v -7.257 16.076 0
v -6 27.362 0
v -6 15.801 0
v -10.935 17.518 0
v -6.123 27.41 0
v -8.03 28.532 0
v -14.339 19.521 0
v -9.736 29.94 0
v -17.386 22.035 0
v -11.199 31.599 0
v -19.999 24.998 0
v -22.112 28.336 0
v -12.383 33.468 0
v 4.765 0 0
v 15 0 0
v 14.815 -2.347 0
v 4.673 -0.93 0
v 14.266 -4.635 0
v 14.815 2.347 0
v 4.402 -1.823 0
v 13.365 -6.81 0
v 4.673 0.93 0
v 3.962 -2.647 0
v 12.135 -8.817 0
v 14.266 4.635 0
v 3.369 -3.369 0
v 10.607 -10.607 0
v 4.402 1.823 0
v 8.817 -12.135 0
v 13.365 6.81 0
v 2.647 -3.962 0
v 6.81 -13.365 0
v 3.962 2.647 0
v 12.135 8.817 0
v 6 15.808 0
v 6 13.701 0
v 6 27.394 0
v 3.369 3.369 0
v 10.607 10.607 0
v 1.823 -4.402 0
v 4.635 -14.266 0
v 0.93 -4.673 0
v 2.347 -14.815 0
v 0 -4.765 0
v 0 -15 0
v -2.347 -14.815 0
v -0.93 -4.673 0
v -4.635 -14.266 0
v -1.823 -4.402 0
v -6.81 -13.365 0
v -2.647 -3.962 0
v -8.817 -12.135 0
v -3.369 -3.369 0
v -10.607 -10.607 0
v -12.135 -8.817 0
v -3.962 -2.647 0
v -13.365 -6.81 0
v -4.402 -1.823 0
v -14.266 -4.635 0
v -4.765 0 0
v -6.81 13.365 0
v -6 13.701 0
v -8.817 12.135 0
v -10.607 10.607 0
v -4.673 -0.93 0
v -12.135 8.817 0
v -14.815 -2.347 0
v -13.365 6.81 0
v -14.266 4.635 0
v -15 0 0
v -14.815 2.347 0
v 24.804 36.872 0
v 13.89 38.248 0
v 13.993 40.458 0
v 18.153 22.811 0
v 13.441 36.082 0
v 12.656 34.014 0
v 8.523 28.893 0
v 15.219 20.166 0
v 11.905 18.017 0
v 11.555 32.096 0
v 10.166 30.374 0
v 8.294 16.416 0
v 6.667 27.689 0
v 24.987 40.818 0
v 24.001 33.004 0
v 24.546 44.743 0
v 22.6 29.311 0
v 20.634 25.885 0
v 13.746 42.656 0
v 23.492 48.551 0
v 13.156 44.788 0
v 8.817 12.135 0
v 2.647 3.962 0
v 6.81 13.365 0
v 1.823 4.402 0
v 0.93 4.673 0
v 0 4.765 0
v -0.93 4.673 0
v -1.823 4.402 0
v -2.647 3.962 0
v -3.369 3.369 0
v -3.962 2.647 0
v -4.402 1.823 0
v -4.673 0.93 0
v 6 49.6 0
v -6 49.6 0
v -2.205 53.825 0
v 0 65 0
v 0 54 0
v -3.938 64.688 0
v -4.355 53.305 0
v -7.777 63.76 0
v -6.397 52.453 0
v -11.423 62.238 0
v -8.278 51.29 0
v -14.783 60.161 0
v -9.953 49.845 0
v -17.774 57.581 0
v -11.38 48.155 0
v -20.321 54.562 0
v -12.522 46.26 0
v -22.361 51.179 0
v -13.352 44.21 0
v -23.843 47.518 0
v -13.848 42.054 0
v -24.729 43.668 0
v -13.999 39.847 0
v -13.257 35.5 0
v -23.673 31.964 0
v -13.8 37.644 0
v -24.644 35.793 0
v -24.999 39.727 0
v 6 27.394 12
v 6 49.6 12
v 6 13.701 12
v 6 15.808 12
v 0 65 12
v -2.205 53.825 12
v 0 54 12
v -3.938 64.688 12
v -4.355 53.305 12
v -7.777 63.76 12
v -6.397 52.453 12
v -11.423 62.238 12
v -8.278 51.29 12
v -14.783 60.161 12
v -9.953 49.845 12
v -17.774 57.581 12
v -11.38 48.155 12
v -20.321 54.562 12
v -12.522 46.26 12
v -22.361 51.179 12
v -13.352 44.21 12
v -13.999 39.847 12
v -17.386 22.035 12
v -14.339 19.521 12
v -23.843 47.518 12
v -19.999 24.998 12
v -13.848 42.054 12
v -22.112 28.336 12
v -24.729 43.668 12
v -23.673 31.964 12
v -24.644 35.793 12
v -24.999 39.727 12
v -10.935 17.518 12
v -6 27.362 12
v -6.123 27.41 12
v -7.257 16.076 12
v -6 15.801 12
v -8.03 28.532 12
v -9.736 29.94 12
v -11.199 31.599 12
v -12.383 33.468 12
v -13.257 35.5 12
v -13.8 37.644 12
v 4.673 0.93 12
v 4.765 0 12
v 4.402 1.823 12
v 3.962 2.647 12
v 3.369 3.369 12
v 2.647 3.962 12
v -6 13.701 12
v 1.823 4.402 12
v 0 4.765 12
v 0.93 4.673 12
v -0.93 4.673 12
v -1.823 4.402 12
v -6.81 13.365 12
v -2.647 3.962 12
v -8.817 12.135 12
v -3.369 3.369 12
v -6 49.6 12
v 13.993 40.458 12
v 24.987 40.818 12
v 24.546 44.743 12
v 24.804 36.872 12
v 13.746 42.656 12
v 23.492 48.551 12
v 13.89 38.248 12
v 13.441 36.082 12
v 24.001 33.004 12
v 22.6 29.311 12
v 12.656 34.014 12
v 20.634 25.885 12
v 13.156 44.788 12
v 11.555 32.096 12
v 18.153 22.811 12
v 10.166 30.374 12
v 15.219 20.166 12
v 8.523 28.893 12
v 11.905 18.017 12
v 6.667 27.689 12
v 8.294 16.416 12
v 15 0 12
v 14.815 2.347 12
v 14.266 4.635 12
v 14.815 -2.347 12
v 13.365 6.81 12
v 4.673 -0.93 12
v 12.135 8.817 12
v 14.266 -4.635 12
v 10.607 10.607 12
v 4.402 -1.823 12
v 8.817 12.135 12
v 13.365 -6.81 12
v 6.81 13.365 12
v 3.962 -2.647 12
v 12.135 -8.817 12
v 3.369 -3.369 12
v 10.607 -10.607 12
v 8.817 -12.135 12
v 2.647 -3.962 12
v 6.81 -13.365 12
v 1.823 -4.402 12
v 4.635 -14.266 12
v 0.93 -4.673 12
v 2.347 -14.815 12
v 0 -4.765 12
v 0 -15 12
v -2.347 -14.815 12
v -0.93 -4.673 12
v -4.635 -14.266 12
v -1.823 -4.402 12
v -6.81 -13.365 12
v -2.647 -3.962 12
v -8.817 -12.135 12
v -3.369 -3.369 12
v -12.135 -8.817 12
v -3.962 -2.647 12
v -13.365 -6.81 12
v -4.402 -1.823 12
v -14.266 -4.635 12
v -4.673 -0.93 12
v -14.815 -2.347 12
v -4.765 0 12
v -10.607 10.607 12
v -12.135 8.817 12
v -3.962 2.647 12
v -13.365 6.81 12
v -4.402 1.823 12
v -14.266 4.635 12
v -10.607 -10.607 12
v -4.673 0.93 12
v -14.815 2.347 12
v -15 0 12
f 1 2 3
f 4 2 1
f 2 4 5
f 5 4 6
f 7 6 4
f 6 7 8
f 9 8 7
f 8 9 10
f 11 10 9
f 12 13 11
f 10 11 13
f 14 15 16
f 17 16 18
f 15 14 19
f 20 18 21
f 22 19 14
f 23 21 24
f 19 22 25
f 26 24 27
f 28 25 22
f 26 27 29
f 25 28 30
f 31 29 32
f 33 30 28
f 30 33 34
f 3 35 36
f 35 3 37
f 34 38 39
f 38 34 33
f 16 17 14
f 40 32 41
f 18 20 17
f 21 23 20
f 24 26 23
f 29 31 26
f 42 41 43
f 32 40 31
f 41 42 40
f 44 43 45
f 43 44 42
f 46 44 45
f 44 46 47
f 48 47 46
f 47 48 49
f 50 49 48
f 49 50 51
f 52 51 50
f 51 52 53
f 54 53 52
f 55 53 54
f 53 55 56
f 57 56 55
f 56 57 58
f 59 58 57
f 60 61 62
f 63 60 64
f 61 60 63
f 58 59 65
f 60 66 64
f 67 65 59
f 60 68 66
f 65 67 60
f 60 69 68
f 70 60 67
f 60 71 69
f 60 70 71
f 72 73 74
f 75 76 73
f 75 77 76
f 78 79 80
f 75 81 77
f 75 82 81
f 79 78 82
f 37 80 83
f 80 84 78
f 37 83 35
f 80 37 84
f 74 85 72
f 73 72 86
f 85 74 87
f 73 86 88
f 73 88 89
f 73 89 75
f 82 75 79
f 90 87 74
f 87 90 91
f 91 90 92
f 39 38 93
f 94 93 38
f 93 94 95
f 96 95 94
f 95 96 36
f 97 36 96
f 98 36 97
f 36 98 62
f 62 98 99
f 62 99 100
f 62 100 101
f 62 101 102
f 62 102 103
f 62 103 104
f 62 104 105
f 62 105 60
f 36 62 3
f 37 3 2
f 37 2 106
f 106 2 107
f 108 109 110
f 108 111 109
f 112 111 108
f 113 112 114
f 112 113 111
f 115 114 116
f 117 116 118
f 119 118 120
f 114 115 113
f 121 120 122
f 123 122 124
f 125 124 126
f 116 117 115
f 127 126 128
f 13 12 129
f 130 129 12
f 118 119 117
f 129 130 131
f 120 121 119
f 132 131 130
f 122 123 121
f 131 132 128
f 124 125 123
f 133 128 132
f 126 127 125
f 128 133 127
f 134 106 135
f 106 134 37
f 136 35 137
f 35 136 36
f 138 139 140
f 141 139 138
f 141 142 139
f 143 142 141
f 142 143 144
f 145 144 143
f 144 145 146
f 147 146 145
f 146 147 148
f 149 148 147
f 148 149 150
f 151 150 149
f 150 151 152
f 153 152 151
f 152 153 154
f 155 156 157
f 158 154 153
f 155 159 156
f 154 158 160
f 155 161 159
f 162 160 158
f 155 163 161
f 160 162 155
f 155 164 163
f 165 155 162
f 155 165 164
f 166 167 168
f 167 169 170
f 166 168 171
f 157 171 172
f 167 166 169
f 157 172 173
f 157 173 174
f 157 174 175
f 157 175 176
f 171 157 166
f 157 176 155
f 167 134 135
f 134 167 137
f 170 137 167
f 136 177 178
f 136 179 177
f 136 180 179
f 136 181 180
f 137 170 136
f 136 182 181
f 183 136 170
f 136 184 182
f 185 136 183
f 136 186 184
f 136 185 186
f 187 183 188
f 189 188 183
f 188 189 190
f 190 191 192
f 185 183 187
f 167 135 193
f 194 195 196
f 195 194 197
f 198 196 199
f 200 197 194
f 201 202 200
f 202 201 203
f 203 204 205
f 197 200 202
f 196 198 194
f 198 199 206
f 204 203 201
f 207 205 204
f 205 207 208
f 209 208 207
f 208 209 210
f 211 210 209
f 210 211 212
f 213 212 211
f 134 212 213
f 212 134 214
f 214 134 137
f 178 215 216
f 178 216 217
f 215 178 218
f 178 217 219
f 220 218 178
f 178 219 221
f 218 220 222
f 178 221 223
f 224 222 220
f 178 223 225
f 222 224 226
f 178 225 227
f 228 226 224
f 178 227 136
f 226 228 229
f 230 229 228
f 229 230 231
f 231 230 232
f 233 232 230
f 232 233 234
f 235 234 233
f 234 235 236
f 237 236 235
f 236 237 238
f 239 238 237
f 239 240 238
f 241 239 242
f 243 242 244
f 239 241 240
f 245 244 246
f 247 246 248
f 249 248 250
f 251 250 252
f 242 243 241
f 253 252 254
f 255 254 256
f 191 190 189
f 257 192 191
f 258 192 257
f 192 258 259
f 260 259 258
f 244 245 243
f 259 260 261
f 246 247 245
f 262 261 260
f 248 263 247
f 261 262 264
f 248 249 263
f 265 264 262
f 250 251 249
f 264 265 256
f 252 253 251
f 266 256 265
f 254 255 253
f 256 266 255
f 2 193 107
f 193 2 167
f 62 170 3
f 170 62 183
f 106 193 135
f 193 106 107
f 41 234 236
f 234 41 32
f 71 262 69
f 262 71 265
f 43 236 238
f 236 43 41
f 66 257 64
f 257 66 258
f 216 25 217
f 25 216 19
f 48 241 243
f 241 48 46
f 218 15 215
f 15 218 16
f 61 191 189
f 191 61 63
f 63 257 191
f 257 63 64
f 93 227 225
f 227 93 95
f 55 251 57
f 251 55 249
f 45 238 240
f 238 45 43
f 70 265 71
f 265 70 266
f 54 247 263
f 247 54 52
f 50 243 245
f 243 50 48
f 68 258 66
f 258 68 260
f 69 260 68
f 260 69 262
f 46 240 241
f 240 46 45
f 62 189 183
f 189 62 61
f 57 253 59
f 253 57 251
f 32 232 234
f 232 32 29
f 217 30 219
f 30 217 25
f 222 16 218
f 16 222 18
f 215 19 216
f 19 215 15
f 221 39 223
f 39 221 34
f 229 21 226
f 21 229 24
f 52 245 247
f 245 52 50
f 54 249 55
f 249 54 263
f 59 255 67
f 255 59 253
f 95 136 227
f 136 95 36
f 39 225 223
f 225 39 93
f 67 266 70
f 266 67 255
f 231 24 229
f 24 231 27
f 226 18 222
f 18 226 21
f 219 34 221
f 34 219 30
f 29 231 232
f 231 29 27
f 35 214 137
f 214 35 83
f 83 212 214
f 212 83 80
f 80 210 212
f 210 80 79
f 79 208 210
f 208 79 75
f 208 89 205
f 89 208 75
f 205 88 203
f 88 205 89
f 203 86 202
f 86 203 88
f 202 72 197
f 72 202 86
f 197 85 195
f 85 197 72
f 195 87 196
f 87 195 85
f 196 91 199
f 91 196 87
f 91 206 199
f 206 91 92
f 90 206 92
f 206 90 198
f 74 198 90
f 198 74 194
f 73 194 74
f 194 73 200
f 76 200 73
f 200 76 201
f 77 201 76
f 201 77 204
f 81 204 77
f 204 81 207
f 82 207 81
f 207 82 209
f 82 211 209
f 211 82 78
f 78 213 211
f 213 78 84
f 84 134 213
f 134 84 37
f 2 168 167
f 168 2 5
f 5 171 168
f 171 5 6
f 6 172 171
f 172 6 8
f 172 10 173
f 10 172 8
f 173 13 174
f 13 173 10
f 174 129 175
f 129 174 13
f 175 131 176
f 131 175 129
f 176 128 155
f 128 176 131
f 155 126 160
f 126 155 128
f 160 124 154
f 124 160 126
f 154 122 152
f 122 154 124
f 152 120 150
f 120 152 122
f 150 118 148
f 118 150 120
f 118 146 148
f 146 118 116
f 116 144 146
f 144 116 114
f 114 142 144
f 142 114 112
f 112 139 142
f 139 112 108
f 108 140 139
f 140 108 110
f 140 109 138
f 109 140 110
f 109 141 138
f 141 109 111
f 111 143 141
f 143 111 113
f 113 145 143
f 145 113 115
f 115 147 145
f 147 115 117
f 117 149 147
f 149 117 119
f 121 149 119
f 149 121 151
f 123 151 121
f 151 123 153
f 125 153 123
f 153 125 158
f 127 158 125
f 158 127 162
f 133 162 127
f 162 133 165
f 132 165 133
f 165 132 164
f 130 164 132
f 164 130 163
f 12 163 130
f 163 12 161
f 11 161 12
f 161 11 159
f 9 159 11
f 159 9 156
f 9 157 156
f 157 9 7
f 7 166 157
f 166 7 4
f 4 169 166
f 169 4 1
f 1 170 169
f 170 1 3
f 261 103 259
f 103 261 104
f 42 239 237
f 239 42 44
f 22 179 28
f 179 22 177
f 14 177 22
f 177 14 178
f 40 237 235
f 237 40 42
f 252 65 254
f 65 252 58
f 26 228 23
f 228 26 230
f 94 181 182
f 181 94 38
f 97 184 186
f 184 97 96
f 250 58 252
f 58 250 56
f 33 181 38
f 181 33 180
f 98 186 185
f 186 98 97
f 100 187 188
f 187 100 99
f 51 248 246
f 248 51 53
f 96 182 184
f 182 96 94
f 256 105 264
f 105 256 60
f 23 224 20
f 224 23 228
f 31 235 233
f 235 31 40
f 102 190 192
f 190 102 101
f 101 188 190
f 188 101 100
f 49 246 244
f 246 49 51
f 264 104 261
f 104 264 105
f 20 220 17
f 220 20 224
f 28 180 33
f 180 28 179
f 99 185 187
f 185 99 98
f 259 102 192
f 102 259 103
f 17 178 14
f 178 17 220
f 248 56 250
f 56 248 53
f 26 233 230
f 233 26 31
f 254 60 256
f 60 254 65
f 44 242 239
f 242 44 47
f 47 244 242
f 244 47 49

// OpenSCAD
$fn = 32;

// ----------------------------------------------------------------------
// Hook: 80 mm shank into a 14 mm curl, 12 mm thick
// ----------------------------------------------------------------------

// --- parameters (mm) ---
shank_len = 80;           // shank length from the boss centre
shank_w = 12;             // shank width
boss_d = 30;              // boss diameter
bore_d = 9.53;            // boss bore
curl_in = 14;             // curl inner radius
curl_out = 25;            // curl outer radius
curl_sweep = 290;         // curl sweep angle
hook_t = 12;              // hook thickness

shank_profile = [[-6, 49.6], [6, 49.6], [6, 13], [-6, 13]];
boss_profile = [[15, 0], [14.815, 2.347], [14.266, 4.635], [13.365, 6.81], [12.135, 8.817], [10.607, 10.607], [8.817, 12.135], [6.81, 13.365], [4.635, 14.266], [2.347, 14.815], [0, 15], [-2.347, 14.815], [-4.635, 14.266], [-6.81, 13.365], [-8.817, 12.135], [-10.607, 10.607], [-12.135, 8.817], [-13.365, 6.81], [-14.266, 4.635], [-14.815, 2.347], [-15, 0], [-14.815, -2.347], [-14.266, -4.635], [-13.365, -6.81], [-12.135, -8.817], [-10.607, -10.607], [-8.817, -12.135], [-6.81, -13.365], [-4.635, -14.266], [-2.347, -14.815], [0, -15], [2.347, -14.815], [4.635, -14.266], [6.81, -13.365], [8.817, -12.135], [10.607, -10.607], [12.135, -8.817], [13.365, -6.81], [14.266, -4.635], [14.815, -2.347]];
curl_profile = [[0, 65], [-3.938, 64.688], [-7.777, 63.76], [-11.423, 62.238], [-14.783, 60.161], [-17.774, 57.581], [-20.321, 54.562], [-22.361, 51.179], [-23.843, 47.518], [-24.729, 43.668], [-24.999, 39.727], [-24.644, 35.793], [-23.673, 31.964], [-22.112, 28.336], [-19.999, 24.998], [-17.386, 22.035], [-14.339, 19.521], [-10.935, 17.518], [-7.257, 16.076], [-3.398, 15.232], [0.545, 15.006], [4.475, 15.404], [8.294, 16.416], [11.905, 18.017], [15.219, 20.166], [18.153, 22.811], [20.634, 25.885], [22.6, 29.311], [24.001, 33.004], [24.804, 36.872], [24.987, 40.818], [24.546, 44.743], [23.492, 48.551], [13.156, 44.788], [13.746, 42.656], [13.993, 40.458], [13.89, 38.248], [13.441, 36.082], [12.656, 34.014], [11.555, 32.096], [10.166, 30.374], [8.523, 28.893], [6.667, 27.689], [4.644, 26.793], [2.506, 26.226], [0.305, 26.003], [-1.903, 26.13], [-4.064, 26.603], [-6.123, 27.41], [-8.03, 28.532], [-9.736, 29.94], [-11.199, 31.599], [-12.383, 33.468], [-13.257, 35.5], [-13.8, 37.644], [-13.999, 39.847], [-13.848, 42.054], [-13.352, 44.21], [-12.522, 46.26], [-11.38, 48.155], [-9.953, 49.845], [-8.278, 51.29], [-6.397, 52.453], [-4.355, 53.305], [-2.205, 53.825], [0, 54]];

difference() {
  union() {
    /* three overlapping outlines: shank, boss and the smooth curl */
    linear_extrude(height = hook_t) polygon(shank_profile);
    linear_extrude(height = hook_t) polygon(boss_profile);
    linear_extrude(height = hook_t) polygon(curl_profile);
  }
  translate([0, 0, -2.5]) cylinder(h = hook_t + 5, d = bore_d);
}
